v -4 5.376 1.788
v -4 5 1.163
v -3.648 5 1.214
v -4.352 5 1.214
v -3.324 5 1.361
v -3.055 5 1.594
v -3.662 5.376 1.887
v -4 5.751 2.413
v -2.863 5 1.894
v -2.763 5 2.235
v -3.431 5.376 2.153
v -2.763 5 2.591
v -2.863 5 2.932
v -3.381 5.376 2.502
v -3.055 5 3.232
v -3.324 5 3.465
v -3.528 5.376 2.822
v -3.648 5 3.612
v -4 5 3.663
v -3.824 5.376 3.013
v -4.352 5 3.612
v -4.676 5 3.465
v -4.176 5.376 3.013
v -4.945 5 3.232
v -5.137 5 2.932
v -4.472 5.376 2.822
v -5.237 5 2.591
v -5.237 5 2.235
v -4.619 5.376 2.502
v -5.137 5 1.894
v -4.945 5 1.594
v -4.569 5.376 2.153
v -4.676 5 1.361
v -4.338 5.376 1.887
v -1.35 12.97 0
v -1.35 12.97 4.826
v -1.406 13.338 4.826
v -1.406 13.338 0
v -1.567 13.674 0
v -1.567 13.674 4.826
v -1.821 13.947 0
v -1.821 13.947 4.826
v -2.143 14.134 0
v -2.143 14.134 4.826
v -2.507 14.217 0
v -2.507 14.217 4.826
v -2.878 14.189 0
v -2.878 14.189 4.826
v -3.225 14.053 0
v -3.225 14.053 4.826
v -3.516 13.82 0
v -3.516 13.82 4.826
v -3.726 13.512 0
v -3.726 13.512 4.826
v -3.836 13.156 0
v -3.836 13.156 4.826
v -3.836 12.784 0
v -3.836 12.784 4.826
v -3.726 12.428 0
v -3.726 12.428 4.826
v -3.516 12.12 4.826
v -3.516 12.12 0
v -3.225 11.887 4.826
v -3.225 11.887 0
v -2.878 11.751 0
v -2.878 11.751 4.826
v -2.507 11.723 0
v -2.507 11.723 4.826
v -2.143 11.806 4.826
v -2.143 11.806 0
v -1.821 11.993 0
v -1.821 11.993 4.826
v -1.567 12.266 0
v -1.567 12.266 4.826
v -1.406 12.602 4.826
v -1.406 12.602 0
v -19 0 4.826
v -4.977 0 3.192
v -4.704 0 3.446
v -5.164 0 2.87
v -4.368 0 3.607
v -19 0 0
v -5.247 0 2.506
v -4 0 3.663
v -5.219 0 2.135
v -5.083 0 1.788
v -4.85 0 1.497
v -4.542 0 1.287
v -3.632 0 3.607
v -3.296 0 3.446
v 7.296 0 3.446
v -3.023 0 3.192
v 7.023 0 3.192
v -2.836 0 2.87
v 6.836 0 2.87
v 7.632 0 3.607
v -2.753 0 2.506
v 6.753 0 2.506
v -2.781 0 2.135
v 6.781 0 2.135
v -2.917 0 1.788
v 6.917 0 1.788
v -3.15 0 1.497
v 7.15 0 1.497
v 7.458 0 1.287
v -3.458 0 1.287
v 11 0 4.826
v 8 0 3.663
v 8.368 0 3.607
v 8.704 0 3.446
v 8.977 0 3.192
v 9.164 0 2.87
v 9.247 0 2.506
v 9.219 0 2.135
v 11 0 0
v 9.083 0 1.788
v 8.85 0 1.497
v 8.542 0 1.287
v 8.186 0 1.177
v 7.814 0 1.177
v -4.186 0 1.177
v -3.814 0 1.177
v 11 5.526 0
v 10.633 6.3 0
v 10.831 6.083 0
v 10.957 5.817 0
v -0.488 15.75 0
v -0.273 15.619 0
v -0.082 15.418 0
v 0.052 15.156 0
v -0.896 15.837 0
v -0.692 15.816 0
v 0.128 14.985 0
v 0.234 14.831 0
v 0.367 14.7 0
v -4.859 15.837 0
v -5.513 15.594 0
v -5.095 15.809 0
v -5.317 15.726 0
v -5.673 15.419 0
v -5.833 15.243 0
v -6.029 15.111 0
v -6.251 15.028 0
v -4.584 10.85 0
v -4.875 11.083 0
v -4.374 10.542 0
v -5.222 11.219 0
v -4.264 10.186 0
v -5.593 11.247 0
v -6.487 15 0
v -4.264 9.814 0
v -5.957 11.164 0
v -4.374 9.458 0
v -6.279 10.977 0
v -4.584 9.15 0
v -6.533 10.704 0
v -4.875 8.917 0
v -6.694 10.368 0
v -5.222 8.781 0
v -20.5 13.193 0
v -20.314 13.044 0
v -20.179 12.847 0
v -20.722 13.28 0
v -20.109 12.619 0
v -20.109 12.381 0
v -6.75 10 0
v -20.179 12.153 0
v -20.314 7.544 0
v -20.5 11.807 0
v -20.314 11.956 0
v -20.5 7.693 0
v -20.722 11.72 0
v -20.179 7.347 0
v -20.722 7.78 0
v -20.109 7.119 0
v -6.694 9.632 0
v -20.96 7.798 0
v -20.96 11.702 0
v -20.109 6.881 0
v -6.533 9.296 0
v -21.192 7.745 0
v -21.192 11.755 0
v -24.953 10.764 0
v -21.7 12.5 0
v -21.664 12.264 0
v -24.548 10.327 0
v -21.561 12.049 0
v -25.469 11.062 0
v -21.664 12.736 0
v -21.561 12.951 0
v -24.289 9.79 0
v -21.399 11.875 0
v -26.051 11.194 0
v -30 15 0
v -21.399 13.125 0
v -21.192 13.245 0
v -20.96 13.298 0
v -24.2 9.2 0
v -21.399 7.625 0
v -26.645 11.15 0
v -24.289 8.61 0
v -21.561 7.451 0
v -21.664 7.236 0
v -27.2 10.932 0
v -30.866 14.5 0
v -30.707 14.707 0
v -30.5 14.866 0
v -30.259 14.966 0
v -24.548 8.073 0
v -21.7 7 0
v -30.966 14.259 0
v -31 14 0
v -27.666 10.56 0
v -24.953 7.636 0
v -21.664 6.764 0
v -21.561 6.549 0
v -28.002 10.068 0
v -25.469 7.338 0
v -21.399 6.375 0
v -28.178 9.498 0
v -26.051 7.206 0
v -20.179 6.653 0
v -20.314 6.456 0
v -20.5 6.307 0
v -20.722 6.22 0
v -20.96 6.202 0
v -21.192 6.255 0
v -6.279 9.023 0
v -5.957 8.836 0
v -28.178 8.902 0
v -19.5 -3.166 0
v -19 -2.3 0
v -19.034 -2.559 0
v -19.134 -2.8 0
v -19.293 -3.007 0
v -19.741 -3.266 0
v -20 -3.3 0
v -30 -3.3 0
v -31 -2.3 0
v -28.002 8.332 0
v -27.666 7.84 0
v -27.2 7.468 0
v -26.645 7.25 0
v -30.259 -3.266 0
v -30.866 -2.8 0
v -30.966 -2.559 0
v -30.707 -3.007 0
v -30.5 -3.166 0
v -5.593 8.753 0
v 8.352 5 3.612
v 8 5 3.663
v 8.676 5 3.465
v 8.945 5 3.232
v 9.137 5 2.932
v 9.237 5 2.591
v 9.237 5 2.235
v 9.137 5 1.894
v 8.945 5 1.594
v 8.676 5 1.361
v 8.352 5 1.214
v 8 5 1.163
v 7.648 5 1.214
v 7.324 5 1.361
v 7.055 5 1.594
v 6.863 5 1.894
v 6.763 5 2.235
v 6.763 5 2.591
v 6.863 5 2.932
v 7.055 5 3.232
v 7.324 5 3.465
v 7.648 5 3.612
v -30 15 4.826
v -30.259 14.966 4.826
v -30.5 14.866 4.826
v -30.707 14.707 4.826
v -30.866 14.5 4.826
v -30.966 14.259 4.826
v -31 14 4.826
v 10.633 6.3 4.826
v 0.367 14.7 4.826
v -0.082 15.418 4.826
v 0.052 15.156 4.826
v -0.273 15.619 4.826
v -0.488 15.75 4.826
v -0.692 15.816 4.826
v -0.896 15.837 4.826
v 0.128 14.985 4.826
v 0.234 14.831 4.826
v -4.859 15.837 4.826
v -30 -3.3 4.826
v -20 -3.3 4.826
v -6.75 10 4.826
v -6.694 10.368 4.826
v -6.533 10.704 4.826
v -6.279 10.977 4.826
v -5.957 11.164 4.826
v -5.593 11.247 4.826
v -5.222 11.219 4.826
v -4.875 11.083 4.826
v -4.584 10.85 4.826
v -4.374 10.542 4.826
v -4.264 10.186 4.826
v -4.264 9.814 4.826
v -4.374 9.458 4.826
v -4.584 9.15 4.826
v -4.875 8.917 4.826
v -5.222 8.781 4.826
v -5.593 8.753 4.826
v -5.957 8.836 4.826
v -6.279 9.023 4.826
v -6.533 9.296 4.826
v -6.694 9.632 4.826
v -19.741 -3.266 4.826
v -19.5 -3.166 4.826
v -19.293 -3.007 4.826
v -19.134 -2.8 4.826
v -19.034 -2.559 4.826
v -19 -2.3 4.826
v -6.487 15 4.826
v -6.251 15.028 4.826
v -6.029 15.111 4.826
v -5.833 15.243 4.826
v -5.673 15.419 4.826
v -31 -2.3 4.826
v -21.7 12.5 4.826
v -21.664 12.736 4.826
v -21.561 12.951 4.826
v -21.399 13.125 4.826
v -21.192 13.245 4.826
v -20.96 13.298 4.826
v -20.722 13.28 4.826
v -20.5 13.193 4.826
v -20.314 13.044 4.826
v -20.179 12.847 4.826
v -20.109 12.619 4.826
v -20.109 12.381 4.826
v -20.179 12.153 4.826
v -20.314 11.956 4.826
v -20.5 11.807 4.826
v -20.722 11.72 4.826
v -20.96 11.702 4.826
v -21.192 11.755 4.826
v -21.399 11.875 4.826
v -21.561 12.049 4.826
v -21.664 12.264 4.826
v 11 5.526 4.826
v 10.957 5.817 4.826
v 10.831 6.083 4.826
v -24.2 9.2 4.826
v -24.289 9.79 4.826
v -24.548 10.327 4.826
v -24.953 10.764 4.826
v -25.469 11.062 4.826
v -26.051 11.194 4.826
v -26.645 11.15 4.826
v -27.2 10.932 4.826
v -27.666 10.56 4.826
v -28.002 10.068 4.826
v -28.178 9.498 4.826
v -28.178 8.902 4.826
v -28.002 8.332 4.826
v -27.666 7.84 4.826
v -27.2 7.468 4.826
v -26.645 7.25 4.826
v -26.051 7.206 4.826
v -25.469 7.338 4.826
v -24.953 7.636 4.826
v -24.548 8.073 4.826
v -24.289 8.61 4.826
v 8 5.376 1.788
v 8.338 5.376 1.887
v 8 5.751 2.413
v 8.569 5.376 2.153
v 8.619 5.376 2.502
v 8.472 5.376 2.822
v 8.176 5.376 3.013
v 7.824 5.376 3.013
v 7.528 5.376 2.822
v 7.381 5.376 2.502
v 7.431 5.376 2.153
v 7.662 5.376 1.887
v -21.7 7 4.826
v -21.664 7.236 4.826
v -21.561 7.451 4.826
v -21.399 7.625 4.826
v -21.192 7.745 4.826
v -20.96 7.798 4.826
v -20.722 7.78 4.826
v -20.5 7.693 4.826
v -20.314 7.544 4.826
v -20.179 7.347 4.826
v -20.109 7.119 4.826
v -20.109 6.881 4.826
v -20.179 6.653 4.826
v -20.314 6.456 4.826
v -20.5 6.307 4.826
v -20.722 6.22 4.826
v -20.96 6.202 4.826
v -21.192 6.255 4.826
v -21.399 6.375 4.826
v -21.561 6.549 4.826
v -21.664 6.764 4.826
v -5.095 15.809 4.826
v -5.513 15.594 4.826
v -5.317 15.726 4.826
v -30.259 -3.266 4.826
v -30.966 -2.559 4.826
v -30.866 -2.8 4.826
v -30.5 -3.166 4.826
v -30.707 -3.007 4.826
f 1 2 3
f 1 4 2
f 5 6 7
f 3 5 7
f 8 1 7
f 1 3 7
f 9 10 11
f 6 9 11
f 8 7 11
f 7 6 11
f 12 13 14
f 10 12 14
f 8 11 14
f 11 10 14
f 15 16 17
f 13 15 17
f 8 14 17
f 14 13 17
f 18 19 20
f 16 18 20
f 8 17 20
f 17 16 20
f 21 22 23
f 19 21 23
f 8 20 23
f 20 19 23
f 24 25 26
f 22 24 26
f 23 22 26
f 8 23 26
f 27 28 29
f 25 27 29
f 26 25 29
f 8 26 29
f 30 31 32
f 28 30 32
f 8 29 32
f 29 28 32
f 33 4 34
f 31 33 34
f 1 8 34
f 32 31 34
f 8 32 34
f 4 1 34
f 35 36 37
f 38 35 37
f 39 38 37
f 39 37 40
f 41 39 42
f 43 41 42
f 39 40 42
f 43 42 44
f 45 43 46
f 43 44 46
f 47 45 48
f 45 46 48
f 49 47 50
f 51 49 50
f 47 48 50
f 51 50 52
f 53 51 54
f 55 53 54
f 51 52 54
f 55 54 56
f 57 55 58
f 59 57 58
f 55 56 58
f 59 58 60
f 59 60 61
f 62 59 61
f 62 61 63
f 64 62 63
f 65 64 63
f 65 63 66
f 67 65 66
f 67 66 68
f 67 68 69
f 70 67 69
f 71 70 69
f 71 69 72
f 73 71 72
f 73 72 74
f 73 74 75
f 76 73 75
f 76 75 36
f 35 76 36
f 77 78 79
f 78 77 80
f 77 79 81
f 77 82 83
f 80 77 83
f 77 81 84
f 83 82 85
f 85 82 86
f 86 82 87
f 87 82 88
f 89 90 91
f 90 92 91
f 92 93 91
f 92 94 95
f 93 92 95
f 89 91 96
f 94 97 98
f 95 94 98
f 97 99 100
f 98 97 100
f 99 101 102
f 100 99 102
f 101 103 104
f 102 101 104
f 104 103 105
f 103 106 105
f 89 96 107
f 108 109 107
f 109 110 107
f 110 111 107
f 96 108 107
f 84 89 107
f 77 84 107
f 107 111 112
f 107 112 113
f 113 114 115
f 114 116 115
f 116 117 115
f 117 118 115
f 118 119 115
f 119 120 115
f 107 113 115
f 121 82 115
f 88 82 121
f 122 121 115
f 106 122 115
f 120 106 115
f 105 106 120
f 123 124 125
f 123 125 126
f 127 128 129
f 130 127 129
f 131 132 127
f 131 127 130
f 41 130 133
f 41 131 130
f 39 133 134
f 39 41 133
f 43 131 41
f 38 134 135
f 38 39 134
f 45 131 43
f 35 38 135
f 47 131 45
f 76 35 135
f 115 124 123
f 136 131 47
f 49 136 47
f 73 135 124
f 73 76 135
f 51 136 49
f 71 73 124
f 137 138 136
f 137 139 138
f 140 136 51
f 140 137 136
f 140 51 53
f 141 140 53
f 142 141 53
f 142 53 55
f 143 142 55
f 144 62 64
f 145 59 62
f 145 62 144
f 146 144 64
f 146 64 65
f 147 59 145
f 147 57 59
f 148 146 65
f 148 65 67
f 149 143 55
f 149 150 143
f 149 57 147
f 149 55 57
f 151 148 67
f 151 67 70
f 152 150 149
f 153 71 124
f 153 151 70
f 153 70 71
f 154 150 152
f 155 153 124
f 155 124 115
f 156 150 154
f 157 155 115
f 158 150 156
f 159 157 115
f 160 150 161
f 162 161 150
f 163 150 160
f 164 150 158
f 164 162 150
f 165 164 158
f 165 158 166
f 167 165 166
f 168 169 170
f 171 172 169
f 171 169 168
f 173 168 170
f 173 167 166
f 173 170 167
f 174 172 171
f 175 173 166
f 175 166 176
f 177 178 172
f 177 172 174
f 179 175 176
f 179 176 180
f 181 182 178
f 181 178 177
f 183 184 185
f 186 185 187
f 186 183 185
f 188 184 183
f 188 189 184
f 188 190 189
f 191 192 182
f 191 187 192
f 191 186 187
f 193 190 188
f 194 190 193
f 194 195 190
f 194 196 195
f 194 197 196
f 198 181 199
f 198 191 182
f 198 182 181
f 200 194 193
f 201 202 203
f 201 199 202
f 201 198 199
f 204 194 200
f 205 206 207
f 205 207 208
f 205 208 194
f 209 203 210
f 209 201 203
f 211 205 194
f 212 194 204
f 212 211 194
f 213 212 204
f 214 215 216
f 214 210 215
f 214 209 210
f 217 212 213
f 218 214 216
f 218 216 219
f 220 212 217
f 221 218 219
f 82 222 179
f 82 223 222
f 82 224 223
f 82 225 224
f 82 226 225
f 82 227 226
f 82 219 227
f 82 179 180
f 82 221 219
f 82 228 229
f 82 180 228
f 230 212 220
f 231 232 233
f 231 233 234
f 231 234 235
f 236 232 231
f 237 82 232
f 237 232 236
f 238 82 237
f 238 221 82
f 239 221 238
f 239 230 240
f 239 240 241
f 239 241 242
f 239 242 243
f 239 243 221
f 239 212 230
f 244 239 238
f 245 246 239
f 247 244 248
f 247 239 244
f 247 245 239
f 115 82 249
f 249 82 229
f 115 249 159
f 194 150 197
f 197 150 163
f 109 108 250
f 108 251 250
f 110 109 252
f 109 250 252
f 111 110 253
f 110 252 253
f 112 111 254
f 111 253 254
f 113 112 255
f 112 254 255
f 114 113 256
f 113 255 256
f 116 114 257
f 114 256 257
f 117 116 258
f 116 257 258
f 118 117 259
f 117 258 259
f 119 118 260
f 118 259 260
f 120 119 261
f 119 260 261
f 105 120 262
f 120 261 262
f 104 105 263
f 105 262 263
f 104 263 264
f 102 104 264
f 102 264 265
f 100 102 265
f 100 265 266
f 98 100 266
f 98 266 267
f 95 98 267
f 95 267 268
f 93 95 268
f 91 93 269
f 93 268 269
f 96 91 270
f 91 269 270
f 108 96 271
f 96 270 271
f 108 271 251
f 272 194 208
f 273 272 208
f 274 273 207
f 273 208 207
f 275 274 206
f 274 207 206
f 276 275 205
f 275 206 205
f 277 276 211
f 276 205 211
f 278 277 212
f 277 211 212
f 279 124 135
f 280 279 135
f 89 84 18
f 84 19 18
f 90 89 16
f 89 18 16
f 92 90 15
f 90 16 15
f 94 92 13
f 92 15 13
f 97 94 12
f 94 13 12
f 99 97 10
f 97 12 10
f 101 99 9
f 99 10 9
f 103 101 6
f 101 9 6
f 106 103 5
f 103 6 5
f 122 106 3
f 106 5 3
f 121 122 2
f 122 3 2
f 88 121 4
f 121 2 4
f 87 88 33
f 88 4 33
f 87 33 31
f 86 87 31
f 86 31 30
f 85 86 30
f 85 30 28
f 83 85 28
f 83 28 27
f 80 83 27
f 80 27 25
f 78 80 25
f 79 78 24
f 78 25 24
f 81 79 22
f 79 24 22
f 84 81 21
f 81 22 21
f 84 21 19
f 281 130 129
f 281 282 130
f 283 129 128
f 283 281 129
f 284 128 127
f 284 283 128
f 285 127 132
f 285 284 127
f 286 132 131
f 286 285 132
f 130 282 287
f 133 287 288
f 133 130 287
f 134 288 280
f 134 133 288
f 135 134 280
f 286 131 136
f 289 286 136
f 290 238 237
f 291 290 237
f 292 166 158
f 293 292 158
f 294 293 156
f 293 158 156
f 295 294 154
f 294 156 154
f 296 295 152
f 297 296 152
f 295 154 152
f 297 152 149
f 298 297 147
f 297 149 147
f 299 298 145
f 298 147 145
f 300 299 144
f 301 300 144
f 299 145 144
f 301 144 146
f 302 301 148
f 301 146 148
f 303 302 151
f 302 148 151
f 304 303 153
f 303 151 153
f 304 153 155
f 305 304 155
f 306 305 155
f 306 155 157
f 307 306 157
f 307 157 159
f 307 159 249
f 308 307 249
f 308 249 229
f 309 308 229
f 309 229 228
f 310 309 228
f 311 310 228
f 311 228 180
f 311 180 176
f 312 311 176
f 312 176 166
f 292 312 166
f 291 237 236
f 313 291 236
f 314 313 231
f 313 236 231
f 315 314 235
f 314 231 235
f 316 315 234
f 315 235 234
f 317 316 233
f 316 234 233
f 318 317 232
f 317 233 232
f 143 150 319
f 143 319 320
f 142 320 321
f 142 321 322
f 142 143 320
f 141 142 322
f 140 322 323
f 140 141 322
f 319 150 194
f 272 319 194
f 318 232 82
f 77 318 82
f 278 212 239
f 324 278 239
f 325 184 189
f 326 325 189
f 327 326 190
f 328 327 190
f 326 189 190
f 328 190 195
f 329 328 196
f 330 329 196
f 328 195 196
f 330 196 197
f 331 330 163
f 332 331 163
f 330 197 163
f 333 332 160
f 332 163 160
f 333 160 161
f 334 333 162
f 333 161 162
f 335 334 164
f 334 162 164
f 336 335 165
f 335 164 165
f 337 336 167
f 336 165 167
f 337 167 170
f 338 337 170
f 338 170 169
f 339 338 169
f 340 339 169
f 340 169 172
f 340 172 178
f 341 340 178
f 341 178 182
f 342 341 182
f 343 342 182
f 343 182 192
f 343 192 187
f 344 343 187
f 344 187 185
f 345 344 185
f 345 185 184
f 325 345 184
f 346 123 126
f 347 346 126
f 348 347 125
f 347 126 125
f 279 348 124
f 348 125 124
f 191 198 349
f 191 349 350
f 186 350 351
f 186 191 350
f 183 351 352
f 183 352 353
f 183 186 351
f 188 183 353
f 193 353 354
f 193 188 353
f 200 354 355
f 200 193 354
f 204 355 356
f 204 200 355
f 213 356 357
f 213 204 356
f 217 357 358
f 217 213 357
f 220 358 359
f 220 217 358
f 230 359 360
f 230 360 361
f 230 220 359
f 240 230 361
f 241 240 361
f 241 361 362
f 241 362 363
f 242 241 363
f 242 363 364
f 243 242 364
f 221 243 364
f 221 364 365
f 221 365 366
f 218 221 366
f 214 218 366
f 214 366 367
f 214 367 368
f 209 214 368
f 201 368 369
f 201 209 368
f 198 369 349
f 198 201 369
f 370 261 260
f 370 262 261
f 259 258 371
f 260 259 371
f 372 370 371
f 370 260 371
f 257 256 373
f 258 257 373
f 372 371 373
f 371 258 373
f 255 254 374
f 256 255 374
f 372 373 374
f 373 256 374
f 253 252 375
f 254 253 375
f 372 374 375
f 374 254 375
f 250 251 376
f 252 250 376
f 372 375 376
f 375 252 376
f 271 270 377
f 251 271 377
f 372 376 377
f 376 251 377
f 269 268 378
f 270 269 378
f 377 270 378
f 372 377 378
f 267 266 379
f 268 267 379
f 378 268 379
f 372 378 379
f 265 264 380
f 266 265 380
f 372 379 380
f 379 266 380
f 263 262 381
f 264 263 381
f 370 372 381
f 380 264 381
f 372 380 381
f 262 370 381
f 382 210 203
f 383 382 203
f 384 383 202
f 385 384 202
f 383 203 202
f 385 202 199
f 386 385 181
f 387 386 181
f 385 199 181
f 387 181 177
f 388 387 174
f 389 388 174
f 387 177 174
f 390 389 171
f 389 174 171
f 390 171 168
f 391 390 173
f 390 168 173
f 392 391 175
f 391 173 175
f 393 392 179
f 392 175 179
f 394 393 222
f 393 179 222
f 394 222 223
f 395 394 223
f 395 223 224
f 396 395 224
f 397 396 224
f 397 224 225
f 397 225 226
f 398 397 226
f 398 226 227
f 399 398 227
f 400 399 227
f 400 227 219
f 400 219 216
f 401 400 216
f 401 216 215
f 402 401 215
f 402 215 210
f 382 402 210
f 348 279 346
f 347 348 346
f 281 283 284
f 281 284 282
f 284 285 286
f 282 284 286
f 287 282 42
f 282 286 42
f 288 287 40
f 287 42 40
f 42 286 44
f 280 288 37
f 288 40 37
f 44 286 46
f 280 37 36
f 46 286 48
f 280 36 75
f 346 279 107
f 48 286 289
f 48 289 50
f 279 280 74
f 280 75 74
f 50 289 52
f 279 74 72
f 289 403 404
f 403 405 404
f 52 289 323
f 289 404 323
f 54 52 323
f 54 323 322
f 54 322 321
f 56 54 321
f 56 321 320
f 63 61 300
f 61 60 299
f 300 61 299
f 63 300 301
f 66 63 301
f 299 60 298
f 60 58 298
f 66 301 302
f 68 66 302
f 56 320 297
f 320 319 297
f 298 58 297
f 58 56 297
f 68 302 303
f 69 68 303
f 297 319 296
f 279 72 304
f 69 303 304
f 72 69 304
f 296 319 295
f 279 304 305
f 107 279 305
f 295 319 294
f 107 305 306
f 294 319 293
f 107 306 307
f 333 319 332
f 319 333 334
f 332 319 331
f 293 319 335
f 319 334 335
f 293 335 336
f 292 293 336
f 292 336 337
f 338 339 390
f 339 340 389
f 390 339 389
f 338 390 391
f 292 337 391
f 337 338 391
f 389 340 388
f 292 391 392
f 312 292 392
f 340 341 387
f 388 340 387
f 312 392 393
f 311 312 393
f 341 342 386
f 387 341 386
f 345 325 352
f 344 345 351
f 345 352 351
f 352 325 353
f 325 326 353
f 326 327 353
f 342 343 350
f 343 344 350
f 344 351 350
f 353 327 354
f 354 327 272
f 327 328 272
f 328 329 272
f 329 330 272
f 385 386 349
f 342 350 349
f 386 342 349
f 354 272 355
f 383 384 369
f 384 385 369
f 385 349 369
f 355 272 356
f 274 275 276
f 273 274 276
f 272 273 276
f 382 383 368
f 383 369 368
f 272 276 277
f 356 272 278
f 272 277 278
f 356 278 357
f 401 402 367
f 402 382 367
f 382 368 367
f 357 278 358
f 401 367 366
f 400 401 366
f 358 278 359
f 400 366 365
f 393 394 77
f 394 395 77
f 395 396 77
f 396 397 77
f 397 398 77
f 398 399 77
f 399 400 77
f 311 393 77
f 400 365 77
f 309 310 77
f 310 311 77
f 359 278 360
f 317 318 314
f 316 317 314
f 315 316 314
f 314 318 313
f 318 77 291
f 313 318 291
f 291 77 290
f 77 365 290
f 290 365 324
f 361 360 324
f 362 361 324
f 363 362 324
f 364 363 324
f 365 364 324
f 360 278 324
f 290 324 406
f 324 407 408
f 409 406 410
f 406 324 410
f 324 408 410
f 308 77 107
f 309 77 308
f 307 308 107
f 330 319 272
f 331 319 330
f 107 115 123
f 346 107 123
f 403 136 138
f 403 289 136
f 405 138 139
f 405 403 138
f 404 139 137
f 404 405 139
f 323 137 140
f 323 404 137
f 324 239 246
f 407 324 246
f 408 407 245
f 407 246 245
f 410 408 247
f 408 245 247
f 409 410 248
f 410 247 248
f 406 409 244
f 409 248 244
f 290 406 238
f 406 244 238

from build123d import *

# Parameters (mm, degrees)
BOSS_EXTRUDE1_DEPTH             = 4.826
M3X0_5_TAPPED_HOLE1_D           = 2.5
TAP_DRILL_FOR_M3X0_5_TAP1_D     = 2.5
TAP_DRILL_FOR_M3X0_5_TAP1_DEPTH = 5
TAP_DRILL_FOR_M3X0_5_TAP1_TIP   = 0.751075774
M3X0_5_TAPPED_HOLE2_D           = 2.5
SKETCH1_3_R                     = 2
BOSS_EXTRUDE2_DEPTH             = 4.826
FILLET1_R                       = 1
M1_TAPPED_HOLES_D               = 1.6
FILLET2_R                       = 1


with BuildPart() as part:
    # Sketch1 → Boss-Extrude1 (new body)
    with BuildSketch(Plane.XY):
        Polygon((-11, 0), (0, 0), (11, 0), (11, 6), (0, 15), (0, 15.837292271), (-5.5, 15.837292271), (-5.5, 15), (-11, 15), align=None)
    extrude(amount=BOSS_EXTRUDE1_DEPTH)

    # M3x0.5 Tapped Hole1 (through all)
    with Locations(Plane.XY.offset(4.826)):
        with Locations((-5.5, 10)):
            Hole(M3X0_5_TAPPED_HOLE1_D / 2)

    # Tap Drill for M3x0.5 Tap1
    with Locations(Plane(origin=(-4, 0, 2.413), x_dir=(0, 0, -1), z_dir=(0, -1, 0))):
        with Locations((0, 0), (0, 12)):
            Hole(TAP_DRILL_FOR_M3X0_5_TAP1_D / 2, depth=TAP_DRILL_FOR_M3X0_5_TAP1_DEPTH)
            with Locations((0, 0, -(TAP_DRILL_FOR_M3X0_5_TAP1_DEPTH + TAP_DRILL_FOR_M3X0_5_TAP1_TIP / 2))):  # 118° drill point
                Cone(0, TAP_DRILL_FOR_M3X0_5_TAP1_D / 2, TAP_DRILL_FOR_M3X0_5_TAP1_TIP, mode=Mode.SUBTRACT)

    # M3x0.5 Tapped Hole2 (through all)
    with Locations(Plane(origin=(-2.6, 12.97, 0), x_dir=(-1, 0, 0), z_dir=(0, 0, -1))):
        with Locations((0, 0)):
            Hole(M3X0_5_TAPPED_HOLE2_D / 2)

    # Sketch1<3> → Boss-Extrude2 (add)
    with BuildSketch(Plane.XY):
        Polygon((-19, 0), (-11, 0), (-11, 15), (-19, 15), (-31, 15), (-31, -3.3), (-19, -3.3), align=None)
        with Locations((-26.2, 9.2)):
            Circle(SKETCH1_3_R, mode=Mode.SUBTRACT)
    extrude(amount=BOSS_EXTRUDE2_DEPTH)

    # Fillet1
    # the kernel refuses this fillet: 1 mm, written as the material it adds along each edge
    with BuildSketch(Plane(origin=(-5.5, 15, 0), x_dir=(-1, 0, 0), z_dir=(0, 0, 1))) as fillet1_piece_1:
        with BuildLine():
            CenterArc((0.98667431, -1), FILLET1_R, 90, 80.635902393)
            Line((0, -0.837292271), (0, 0))
            Line((0, 0), (0.98667431, 0))
        make_face()
    extrude(amount=4.826)
    with BuildSketch(Plane(origin=(0, 15, 0), x_dir=(0, 1, 0), z_dir=(0, 0, 1))) as fillet1_piece_2:
        with BuildLine():
            CenterArc((FILLET1_R * 0.473879127596, -FILLET1_R), FILLET1_R, 90, 50.710593137)
            Line((-FILLET1_R * 0.300078171608, -FILLET1_R * 0.366762209743), (0, 0))
            Line((0, 0), (FILLET1_R * 0.473879127596, 0))
        make_face()
    extrude(amount=4.826)
    # the kernel refuses this fillet: 1 mm, written as the material it takes off along each edge
    with BuildSketch(Plane(origin=(-31, 15, -2.5), x_dir=(1, 0, 0), z_dir=(0, 0, 1)), Plane(origin=(-19, -3.3, -2.5), x_dir=(-1, 0, 0), z_dir=(0, 0, 1)), Plane(origin=(-31, -3.3, -2.5), x_dir=(0, 1, 0), z_dir=(0, 0, 1))) as fillet1_2_piece_1:
        with BuildLine():
            CenterArc((FILLET1_R, -FILLET1_R), FILLET1_R, 90, 90)
            Line((0, -FILLET1_R), (0, 0))
            Line((0, 0), (FILLET1_R, 0))
        make_face()
    extrude(amount=9.826, mode=Mode.SUBTRACT)
    with BuildSketch(Plane(origin=(11, 6, -1.184697819), x_dir=(0, -1, 0), z_dir=(0, 0, 1))) as fillet1_2_piece_2:
        with BuildLine():
            CenterArc((FILLET1_R * 0.473879127596, -FILLET1_R), FILLET1_R, 90, 50.710593137)
            Line((-FILLET1_R * 0.300078171608, -FILLET1_R * 0.366762209743), (0, 0))
            Line((0, 0), (FILLET1_R * 0.473879127596, 0))
        make_face()
    extrude(amount=7.195395638, mode=Mode.SUBTRACT)

    # M1 Tapped Holes (through all)
    with Locations(Plane.XY.offset(4.826)):
        with Locations((-20.9, 12.5), (-20.9, 7)):
            Hole(M1_TAPPED_HOLES_D / 2)

    # Fillet2
    fillet2_edges = [part.edges().sort_by_distance(p)[0] for p in [
        (0, 15.837292271, 2.413),
        (-5.5, 15.837292271, 2.413),
    ]]
    fillet(fillet2_edges, radius=FILLET2_R)


solid = part.part
